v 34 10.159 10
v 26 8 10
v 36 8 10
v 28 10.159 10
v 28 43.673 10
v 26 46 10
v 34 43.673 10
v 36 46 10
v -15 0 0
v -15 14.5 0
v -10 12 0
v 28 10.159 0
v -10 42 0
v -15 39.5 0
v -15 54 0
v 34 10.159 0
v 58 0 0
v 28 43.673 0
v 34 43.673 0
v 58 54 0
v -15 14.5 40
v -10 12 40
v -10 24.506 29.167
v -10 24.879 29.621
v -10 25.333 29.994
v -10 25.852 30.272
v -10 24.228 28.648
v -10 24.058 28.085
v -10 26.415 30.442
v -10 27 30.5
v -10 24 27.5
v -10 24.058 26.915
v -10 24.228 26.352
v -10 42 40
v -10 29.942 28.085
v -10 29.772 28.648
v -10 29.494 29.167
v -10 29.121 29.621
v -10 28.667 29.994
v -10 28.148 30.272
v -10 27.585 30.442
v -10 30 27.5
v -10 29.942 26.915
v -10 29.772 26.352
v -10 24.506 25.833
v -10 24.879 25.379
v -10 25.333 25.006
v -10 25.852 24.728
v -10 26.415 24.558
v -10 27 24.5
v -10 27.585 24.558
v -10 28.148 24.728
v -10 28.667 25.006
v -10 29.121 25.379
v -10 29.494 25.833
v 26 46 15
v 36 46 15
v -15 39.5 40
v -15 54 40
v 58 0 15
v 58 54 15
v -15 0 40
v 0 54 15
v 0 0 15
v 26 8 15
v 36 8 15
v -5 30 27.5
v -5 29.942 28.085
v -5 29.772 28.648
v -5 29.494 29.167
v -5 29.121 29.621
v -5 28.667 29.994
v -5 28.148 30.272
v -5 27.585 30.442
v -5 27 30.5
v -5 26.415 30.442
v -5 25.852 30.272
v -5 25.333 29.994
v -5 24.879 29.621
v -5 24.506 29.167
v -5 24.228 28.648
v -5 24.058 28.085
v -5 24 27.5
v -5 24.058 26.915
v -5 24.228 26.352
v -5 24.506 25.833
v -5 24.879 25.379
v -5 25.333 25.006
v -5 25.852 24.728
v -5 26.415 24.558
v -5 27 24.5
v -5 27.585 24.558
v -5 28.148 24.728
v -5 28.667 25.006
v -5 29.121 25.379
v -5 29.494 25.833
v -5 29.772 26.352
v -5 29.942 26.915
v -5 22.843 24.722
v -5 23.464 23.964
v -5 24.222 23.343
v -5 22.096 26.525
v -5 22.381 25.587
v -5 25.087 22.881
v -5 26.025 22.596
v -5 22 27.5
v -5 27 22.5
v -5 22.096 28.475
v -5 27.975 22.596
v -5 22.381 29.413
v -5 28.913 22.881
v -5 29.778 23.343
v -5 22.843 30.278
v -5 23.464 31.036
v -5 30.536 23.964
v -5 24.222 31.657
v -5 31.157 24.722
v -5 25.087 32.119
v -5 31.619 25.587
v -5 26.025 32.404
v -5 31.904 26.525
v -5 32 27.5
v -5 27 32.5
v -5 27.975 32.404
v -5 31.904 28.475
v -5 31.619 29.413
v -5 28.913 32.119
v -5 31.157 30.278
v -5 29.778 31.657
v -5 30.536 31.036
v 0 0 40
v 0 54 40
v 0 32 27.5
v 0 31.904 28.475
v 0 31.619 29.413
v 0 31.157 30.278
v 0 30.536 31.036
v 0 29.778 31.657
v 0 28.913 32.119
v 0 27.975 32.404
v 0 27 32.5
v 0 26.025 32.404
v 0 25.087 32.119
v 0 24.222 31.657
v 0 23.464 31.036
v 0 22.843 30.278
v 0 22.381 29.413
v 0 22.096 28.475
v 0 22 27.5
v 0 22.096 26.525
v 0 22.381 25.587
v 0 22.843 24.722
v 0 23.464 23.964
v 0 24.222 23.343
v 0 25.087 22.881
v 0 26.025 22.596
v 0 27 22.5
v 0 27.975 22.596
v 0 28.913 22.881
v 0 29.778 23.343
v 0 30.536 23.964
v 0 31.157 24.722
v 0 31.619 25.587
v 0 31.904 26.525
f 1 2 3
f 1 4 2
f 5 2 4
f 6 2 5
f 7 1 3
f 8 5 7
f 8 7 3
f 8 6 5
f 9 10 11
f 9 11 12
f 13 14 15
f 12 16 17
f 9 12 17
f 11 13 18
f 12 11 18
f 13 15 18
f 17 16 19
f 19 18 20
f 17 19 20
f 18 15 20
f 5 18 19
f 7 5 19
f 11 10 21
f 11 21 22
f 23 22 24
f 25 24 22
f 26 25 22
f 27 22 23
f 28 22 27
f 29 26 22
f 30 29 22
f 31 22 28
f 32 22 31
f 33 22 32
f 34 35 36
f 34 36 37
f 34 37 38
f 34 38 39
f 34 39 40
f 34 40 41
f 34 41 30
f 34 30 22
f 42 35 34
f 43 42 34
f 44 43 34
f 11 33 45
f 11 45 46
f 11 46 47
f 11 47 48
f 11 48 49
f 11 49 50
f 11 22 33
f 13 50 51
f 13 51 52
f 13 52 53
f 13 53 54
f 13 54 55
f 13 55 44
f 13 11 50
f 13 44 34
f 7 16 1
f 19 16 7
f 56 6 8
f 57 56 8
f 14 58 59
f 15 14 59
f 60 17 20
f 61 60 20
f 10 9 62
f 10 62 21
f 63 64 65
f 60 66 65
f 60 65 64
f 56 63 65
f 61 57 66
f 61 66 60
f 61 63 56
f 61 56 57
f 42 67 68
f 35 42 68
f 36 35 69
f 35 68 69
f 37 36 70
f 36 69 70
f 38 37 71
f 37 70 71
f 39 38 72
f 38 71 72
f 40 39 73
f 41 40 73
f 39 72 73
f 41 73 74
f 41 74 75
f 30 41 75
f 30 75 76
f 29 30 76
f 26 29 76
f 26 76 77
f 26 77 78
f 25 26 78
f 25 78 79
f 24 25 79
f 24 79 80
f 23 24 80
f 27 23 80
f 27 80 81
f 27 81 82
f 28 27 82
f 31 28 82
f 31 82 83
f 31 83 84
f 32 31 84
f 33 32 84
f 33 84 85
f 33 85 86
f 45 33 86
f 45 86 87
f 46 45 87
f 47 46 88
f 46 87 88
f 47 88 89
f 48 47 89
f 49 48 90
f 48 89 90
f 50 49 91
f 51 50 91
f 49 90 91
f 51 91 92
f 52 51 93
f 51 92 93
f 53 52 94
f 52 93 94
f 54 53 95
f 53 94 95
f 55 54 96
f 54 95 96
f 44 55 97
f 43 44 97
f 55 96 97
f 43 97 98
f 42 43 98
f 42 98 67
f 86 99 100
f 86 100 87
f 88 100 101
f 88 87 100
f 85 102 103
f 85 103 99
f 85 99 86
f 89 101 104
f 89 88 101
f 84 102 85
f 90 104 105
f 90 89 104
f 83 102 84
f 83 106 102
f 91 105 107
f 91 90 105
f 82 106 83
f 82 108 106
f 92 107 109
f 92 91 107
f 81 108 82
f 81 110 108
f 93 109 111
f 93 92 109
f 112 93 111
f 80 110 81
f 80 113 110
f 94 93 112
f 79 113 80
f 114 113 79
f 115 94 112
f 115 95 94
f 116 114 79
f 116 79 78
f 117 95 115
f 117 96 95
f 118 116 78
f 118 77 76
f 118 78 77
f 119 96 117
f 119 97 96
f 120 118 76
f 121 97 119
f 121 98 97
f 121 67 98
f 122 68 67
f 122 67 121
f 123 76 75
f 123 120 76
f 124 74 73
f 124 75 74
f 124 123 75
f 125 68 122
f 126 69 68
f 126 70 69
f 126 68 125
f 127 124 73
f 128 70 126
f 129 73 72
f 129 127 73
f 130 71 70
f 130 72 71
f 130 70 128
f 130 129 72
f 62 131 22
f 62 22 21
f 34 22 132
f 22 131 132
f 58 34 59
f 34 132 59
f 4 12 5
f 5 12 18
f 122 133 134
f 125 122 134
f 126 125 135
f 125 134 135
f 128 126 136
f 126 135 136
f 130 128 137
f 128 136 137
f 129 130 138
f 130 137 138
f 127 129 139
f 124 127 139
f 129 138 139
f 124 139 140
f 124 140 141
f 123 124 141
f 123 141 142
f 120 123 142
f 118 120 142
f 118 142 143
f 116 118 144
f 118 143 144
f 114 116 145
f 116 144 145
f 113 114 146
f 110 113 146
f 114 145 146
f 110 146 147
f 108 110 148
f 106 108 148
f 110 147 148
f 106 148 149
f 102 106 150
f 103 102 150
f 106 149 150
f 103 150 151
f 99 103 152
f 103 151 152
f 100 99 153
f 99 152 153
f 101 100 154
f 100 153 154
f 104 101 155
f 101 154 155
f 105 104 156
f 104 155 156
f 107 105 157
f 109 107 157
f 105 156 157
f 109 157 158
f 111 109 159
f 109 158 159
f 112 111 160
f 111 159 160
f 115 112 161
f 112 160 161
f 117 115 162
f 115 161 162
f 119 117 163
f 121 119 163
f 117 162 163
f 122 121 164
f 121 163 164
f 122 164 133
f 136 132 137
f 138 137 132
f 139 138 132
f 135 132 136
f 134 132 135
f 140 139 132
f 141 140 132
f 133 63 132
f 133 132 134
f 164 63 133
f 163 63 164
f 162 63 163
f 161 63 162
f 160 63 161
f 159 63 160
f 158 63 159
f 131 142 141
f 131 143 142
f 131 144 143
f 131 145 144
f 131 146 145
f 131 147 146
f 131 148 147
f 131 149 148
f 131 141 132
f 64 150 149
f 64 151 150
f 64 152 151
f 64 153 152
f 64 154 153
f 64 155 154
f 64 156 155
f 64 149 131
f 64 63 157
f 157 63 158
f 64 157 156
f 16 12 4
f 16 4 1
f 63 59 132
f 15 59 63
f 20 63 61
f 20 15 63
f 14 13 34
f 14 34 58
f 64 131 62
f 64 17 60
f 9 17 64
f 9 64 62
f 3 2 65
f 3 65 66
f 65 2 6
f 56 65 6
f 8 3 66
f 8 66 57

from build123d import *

# Parameters (mm, degrees)
SKETCH_W        = 58
SKETCH_H        = 54
SKETCH_W_2      = 10
SKETCH_H_2      = 38
PAD_DEPTH       = 15
PAD001_DEPTH    = 40
SKETCH002_W     = 10
SKETCH002_H     = 38
SKETCH002_W_2   = 6
SKETCH002_H_2   = 33.513506
PAD002_DEPTH    = 10
SKETCH004_R     = 5
POCKET_DEPTH    = 5
SKETCH005_R     = 3
POCKET001_DEPTH = 10


with BuildPart() as part:
    # Sketch → Pad (new body)
    with BuildSketch(Plane.XY):
        with Locations((29, 27)):
            Rectangle(SKETCH_W, SKETCH_H)
        with Locations((31, 27)):
            Rectangle(SKETCH_W_2, SKETCH_H_2, mode=Mode.SUBTRACT)
    extrude(amount=PAD_DEPTH)

    # Sketch003 → Pad001 (new body)
    with BuildSketch(Plane.XY):
        Polygon((-15, 0), (-15, 14.5), (-10, 12), (-10, 42), (-15, 39.5), (-15, 54), (0, 54), (0, 0), align=None)
    extrude(amount=PAD001_DEPTH)

    # Sketch002 → Pad002 (new body)
    with BuildSketch(Plane.XY):
        with Locations((31, 27)):
            Rectangle(SKETCH002_W, SKETCH002_H)
        with Locations((31, 26.915923)):
            Rectangle(SKETCH002_W_2, SKETCH002_H_2, mode=Mode.SUBTRACT)
    extrude(amount=PAD002_DEPTH)

    # Sketch004 → Pocket (cut)
    with BuildSketch(Plane.YZ):
        with Locations((27, 27.5)):
            Circle(SKETCH004_R)
    extrude(amount=-POCKET_DEPTH, mode=Mode.SUBTRACT)

    # Sketch005 → Pocket001 (cut)
    with BuildSketch(Plane.YZ):
        with Locations((27, 27.5)):
            Circle(SKETCH005_R)
    extrude(amount=-POCKET001_DEPTH, mode=Mode.SUBTRACT)


solid = part.part
